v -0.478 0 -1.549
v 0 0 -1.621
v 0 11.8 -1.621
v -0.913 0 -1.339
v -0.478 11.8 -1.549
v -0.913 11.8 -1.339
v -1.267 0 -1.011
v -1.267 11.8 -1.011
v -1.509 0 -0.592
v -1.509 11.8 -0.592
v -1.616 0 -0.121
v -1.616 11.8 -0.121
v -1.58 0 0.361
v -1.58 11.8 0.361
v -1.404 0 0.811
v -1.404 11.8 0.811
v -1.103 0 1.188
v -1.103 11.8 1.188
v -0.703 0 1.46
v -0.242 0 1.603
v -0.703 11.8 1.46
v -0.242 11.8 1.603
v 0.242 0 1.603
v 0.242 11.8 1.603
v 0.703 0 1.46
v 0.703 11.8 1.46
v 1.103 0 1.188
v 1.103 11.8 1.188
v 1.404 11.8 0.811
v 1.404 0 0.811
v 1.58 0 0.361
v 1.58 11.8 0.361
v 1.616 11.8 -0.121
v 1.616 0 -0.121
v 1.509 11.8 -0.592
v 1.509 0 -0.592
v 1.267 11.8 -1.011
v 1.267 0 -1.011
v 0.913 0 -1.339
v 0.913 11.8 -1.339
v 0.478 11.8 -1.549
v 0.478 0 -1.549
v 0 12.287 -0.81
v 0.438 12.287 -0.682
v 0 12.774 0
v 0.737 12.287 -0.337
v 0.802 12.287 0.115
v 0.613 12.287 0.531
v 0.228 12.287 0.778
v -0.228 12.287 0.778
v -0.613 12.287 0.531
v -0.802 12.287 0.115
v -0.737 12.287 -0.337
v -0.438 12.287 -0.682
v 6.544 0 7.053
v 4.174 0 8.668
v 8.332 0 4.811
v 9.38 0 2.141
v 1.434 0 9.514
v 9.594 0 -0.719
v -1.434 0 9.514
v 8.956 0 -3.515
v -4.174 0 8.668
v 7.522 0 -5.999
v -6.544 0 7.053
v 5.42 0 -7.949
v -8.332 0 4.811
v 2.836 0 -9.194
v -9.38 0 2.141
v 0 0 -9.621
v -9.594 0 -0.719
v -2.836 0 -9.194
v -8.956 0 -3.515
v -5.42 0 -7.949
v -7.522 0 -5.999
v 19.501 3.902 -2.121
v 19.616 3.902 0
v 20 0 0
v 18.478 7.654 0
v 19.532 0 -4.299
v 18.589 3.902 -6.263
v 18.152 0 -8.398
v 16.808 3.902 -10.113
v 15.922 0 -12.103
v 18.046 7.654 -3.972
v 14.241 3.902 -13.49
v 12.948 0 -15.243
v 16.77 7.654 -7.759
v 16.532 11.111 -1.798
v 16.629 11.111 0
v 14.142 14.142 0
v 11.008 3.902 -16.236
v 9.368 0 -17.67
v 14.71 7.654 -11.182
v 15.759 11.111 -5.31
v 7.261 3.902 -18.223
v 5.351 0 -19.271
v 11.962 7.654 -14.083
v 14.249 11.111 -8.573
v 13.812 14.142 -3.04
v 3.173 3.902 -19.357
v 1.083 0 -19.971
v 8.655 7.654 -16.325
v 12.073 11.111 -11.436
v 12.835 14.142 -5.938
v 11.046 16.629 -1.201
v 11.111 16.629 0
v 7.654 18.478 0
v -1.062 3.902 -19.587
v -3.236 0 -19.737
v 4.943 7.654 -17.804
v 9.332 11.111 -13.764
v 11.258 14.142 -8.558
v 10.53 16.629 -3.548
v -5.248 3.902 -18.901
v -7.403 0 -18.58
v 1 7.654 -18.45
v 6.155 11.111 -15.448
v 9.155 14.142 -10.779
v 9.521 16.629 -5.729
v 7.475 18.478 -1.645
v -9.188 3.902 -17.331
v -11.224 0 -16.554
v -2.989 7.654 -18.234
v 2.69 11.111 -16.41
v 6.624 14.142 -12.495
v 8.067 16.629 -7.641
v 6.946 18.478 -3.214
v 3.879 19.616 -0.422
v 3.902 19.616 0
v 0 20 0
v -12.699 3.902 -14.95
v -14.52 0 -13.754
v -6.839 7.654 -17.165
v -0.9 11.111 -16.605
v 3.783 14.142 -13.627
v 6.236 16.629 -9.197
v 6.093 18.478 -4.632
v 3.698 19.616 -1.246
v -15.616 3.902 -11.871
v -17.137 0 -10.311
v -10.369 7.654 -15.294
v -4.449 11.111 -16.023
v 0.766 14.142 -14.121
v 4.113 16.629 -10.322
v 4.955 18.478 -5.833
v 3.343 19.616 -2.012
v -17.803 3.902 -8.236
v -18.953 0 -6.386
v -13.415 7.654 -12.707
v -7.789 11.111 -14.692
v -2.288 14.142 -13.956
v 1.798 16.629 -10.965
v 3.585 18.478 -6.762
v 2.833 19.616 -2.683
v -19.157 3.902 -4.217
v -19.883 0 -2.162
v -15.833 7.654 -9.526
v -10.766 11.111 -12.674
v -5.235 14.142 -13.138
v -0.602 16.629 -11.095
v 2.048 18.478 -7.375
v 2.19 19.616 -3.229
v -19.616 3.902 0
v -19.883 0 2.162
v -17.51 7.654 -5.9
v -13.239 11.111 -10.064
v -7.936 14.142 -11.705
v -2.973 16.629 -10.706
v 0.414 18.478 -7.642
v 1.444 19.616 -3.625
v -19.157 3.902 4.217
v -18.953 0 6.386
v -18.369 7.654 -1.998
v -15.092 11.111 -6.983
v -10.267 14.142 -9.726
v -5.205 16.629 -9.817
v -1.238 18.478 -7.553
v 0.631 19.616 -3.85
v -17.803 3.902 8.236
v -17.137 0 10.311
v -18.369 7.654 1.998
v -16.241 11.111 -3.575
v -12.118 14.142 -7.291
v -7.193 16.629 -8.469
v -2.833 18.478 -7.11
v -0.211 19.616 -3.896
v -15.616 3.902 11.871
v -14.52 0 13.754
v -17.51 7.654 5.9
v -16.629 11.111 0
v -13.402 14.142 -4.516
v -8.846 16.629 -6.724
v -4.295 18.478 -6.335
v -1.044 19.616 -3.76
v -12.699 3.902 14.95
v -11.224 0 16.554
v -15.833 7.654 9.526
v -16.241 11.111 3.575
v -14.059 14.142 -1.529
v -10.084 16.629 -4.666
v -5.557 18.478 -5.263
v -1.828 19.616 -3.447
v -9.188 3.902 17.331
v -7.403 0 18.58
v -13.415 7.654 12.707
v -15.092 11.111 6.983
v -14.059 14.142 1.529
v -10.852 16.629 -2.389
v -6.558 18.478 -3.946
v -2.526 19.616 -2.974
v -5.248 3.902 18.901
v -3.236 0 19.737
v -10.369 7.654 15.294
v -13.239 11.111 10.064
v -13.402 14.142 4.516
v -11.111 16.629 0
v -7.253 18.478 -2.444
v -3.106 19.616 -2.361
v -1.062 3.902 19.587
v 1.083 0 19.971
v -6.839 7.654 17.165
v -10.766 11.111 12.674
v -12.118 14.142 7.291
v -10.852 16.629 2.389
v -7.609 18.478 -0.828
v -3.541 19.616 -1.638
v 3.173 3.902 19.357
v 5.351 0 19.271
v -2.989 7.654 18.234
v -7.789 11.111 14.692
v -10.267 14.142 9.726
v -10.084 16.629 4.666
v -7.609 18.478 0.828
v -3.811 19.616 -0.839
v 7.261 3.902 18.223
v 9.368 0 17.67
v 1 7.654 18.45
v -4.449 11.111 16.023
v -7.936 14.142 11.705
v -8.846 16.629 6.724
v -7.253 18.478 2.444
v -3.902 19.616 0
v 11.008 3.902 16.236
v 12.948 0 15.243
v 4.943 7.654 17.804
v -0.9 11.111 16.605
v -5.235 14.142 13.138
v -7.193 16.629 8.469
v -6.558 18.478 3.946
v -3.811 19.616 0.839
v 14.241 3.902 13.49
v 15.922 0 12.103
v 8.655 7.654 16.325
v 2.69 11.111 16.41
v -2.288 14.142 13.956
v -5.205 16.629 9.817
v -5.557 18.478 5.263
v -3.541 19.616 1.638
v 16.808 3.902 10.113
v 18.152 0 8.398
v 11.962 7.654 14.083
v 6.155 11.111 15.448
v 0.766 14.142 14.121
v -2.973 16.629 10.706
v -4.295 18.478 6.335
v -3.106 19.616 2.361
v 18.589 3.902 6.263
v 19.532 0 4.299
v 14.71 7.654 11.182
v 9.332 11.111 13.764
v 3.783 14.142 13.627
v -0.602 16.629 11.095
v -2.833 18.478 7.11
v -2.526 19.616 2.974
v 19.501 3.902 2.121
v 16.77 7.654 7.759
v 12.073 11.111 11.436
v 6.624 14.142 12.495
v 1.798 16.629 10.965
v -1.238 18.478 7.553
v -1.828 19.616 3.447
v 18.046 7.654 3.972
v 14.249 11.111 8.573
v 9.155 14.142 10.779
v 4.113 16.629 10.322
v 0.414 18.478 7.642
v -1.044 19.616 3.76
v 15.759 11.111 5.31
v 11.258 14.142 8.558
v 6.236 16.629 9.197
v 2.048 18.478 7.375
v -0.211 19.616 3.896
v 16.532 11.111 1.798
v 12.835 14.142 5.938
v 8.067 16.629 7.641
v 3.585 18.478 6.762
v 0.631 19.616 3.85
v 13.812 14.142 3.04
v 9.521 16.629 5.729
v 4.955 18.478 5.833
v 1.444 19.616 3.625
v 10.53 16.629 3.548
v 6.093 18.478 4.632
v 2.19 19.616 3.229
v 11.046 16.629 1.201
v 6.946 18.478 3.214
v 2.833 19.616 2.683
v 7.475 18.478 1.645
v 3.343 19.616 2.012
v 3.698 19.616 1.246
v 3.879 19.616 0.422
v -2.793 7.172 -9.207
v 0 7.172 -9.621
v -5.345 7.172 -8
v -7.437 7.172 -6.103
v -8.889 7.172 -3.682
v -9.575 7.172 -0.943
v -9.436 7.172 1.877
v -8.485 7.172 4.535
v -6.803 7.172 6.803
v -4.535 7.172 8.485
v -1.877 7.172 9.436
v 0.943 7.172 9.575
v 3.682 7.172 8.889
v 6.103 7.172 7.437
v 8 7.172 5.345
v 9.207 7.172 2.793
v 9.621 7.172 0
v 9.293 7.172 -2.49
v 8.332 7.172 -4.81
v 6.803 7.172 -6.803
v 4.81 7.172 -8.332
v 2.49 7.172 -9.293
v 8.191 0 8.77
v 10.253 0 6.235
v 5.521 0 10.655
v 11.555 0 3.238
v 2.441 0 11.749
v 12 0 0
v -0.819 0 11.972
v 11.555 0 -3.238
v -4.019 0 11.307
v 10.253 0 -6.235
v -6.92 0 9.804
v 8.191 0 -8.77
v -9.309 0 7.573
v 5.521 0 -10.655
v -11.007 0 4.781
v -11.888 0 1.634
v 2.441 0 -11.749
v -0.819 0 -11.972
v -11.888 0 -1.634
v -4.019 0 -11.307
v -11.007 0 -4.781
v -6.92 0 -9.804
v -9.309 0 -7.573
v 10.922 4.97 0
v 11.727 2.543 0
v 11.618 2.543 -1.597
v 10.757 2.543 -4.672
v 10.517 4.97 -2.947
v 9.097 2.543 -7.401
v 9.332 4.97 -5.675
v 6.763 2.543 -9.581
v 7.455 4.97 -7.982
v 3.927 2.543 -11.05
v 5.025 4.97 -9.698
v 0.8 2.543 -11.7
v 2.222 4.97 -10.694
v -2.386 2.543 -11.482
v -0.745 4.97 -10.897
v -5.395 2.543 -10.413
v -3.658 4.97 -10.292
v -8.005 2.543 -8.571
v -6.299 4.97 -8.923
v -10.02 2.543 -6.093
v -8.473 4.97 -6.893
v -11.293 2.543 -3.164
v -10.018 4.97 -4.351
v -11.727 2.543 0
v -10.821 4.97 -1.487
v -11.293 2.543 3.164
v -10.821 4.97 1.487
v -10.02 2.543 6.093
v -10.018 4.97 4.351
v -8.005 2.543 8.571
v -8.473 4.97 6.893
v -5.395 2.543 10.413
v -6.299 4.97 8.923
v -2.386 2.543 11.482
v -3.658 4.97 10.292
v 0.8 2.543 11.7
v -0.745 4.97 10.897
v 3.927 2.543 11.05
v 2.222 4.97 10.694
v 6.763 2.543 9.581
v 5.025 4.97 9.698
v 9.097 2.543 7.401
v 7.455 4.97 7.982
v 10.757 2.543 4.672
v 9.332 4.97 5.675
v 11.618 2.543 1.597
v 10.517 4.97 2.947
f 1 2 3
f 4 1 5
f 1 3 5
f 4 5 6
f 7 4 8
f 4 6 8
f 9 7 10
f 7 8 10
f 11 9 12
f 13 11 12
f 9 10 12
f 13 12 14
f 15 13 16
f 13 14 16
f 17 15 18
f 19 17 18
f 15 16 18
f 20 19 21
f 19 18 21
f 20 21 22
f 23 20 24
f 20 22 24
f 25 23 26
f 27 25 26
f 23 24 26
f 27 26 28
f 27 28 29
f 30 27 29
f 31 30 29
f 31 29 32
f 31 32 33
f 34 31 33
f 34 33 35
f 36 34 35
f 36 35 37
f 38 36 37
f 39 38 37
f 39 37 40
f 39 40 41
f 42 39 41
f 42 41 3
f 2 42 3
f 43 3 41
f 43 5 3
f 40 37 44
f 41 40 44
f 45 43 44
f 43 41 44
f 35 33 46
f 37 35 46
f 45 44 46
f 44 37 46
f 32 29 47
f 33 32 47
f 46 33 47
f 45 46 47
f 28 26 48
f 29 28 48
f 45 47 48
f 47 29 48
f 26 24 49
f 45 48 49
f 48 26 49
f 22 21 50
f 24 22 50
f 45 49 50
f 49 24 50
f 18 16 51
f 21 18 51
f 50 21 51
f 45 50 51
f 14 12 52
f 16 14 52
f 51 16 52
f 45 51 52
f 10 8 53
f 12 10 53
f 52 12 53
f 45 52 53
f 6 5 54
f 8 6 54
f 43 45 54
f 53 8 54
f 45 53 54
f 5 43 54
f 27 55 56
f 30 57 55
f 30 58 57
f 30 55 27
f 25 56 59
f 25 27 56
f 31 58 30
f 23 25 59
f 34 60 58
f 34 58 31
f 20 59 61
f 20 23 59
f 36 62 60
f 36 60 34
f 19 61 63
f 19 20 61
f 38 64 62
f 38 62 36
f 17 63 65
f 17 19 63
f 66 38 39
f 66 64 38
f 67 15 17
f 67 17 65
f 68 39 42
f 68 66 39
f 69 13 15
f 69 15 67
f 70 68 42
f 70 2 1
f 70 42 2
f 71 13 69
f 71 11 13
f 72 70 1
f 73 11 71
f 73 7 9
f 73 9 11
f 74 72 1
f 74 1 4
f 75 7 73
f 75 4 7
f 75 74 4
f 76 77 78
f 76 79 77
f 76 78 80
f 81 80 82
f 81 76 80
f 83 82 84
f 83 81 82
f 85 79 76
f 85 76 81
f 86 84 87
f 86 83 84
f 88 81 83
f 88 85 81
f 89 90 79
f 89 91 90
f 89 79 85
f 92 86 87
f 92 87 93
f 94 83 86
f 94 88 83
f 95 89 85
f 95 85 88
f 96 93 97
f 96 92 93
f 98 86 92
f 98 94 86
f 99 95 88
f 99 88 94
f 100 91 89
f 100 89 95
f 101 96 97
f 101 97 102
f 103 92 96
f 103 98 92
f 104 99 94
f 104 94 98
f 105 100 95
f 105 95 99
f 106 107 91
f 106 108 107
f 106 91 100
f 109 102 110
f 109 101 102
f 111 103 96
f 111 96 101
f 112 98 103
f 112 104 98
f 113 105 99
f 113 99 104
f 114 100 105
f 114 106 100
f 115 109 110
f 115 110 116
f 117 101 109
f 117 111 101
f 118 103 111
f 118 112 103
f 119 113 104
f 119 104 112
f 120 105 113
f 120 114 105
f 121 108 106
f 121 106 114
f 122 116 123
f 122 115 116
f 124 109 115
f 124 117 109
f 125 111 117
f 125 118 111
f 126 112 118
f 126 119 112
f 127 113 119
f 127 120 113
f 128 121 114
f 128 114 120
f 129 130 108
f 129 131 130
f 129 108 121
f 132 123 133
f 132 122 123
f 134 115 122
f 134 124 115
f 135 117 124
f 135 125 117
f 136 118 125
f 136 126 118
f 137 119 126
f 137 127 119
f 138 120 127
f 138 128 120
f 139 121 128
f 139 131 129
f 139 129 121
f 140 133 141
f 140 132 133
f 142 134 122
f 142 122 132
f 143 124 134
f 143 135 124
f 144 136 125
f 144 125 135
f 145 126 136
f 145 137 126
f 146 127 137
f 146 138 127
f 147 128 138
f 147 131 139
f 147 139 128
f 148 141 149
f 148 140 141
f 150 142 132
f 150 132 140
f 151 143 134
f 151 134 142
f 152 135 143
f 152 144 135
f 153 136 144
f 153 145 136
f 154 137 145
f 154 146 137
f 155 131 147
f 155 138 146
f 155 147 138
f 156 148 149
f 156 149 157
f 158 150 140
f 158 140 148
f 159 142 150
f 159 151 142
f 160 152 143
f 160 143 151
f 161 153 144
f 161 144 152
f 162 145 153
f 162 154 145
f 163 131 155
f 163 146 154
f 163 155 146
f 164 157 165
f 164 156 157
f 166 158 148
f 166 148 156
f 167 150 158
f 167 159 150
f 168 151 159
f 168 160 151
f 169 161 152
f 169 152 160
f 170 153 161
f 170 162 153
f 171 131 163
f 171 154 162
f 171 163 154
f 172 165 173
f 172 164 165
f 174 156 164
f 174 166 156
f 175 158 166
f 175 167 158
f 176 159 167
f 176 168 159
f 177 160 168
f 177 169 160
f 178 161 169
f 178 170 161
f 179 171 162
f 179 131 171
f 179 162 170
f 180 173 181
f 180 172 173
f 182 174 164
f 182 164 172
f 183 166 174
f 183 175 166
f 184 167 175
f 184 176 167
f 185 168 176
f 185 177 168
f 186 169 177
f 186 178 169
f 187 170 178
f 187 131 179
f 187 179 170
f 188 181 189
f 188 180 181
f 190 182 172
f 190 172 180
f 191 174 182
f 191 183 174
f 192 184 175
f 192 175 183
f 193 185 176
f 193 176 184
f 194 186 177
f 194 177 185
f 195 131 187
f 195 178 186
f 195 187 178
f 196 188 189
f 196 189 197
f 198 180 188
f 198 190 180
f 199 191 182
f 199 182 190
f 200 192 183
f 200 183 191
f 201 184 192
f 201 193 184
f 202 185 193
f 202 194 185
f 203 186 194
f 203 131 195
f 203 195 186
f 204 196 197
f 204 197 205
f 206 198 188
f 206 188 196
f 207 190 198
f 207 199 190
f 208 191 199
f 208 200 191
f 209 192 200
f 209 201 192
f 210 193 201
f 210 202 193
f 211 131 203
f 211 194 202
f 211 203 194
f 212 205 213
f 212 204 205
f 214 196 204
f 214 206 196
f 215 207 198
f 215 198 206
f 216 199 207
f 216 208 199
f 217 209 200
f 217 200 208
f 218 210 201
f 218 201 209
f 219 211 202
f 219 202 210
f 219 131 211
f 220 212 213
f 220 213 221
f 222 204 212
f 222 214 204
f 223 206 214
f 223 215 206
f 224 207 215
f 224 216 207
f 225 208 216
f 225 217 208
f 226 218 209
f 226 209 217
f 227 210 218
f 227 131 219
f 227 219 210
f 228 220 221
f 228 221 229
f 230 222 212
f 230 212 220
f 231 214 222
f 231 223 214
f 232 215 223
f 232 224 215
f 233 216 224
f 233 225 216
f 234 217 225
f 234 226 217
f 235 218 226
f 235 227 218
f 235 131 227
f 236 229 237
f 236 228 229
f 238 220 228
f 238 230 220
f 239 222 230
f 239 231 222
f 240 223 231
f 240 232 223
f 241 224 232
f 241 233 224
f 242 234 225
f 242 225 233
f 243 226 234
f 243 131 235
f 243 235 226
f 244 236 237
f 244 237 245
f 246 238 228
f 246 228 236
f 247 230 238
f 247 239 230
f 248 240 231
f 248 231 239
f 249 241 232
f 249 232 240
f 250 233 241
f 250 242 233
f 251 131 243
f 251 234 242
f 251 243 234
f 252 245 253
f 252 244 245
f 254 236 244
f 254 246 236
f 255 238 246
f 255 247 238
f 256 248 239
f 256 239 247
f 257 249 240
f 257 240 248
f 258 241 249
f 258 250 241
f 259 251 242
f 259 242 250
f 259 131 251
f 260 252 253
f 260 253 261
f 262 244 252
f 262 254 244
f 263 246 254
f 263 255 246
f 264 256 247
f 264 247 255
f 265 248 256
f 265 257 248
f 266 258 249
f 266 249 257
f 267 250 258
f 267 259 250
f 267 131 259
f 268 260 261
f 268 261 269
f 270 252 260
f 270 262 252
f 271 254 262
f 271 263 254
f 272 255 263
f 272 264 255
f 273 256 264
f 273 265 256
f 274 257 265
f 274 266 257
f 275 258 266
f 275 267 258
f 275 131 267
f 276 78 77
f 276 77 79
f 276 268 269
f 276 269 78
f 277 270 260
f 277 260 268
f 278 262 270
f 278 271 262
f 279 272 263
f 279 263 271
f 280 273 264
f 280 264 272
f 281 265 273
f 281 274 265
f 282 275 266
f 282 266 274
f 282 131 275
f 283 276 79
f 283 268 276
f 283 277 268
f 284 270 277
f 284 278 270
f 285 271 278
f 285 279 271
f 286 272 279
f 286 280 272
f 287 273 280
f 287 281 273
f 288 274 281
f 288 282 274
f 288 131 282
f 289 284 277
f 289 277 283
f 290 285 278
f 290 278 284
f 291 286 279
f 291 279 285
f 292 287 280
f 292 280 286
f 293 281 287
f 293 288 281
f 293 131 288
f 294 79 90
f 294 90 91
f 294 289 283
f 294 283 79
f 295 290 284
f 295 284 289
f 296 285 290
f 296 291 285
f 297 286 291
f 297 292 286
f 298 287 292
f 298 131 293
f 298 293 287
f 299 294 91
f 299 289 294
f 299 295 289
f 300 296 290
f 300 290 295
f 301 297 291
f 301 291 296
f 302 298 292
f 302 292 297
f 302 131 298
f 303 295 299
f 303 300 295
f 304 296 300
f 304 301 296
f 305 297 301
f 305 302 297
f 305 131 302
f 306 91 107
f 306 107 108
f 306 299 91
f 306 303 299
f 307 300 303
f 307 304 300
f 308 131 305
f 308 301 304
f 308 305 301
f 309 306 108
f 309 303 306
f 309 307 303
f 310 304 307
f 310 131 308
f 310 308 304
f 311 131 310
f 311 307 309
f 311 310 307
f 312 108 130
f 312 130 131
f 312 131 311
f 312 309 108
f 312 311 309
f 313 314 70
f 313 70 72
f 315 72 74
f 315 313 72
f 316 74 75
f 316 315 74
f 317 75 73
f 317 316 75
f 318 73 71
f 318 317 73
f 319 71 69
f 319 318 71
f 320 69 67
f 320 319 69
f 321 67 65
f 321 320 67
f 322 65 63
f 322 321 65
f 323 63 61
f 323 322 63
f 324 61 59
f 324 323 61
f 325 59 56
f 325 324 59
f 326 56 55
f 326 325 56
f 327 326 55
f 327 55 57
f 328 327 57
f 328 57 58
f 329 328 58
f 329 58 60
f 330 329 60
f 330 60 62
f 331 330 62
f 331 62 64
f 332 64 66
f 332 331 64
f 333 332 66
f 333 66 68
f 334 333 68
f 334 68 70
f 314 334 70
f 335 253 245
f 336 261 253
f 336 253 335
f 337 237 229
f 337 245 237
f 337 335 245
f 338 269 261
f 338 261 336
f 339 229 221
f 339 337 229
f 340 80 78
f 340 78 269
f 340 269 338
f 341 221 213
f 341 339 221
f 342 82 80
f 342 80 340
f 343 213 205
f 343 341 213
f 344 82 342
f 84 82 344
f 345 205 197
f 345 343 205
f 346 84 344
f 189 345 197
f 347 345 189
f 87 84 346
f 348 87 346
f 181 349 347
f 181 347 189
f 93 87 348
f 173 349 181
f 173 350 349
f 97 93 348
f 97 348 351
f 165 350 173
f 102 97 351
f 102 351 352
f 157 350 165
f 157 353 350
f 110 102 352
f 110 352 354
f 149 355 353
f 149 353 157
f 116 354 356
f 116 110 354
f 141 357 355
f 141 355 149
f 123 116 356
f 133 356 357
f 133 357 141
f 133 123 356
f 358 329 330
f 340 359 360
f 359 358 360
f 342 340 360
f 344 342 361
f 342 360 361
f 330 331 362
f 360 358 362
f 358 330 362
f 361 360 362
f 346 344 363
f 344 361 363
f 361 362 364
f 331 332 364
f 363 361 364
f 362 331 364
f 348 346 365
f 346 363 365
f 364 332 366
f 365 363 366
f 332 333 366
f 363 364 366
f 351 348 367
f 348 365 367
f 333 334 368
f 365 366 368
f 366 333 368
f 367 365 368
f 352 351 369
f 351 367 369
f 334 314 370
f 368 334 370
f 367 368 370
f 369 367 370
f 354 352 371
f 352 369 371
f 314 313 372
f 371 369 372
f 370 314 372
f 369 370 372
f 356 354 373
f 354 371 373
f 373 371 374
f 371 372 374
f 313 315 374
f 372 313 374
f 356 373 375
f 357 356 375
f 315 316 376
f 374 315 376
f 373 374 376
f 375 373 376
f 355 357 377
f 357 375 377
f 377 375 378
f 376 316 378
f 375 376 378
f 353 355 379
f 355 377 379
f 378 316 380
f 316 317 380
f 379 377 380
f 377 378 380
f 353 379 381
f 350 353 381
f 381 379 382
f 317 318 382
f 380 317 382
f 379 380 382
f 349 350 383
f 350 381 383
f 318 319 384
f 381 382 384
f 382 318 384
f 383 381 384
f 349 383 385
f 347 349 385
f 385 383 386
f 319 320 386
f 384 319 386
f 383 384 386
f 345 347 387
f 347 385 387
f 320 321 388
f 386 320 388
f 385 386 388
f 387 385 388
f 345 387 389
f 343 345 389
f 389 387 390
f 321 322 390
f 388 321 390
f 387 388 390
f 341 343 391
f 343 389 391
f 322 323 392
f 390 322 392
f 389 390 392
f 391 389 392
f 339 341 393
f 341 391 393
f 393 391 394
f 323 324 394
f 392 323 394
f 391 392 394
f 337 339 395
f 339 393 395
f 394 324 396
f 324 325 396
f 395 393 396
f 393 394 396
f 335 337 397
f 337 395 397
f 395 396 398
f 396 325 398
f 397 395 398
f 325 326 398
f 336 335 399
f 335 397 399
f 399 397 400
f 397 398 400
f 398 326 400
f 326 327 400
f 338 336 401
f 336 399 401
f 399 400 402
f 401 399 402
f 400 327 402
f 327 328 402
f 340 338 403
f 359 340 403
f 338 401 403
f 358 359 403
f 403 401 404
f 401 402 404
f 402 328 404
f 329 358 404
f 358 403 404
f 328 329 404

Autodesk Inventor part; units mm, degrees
ref_plane "YZ Plane" through (0, 0, 0) normal (1, 0, 0) x (0, 1, 0)
ref_plane "XZ Plane" through (0, 0, 0) normal (0, 1, 0) x (-1, 0, 0)
ref_plane "XY Plane" through (0, 0, 0) normal (0, 0, 1) x (1, 0, 0)
sketch "Sketch1" plane through (0, 0, 0) normal (0, 0, 1) x (1, 0, 0)
  line L0 (0, 0) -> (0, 20)
  line L1 (0, 0) -> (20, 0)
  arc A0 (20, 0) -> (0, 20) centre (0, 0) ccw
  line L2 (0, -4.8284) -> (0, 28.9706) projected
  dimension "d2" = 20
revolve "Revolution1" add sketch "Sketch1" angle 360 about axis through (0, -10, 0) along (0, 1, 0)
sketch "Sketch4" plane through (0, 0, 0) normal (0, -1, 0) x (1, 0, 0)
  point P0 (0, 0)
  point P1 (0, 0)
hole "Hole2" at (0, 0, 0) direction (0, 1, 0) diameter 3.242 depth 11.8 tip angle 118 thread size "M4x0.7" class "6H" standard "ANSI Metric M Profile"
shell "Shell2" thickness 8 removed faces 1 at (13.676, 0, 1.6606)
properties part number "Ball_Upper Half" material "Nylon 6/6"
